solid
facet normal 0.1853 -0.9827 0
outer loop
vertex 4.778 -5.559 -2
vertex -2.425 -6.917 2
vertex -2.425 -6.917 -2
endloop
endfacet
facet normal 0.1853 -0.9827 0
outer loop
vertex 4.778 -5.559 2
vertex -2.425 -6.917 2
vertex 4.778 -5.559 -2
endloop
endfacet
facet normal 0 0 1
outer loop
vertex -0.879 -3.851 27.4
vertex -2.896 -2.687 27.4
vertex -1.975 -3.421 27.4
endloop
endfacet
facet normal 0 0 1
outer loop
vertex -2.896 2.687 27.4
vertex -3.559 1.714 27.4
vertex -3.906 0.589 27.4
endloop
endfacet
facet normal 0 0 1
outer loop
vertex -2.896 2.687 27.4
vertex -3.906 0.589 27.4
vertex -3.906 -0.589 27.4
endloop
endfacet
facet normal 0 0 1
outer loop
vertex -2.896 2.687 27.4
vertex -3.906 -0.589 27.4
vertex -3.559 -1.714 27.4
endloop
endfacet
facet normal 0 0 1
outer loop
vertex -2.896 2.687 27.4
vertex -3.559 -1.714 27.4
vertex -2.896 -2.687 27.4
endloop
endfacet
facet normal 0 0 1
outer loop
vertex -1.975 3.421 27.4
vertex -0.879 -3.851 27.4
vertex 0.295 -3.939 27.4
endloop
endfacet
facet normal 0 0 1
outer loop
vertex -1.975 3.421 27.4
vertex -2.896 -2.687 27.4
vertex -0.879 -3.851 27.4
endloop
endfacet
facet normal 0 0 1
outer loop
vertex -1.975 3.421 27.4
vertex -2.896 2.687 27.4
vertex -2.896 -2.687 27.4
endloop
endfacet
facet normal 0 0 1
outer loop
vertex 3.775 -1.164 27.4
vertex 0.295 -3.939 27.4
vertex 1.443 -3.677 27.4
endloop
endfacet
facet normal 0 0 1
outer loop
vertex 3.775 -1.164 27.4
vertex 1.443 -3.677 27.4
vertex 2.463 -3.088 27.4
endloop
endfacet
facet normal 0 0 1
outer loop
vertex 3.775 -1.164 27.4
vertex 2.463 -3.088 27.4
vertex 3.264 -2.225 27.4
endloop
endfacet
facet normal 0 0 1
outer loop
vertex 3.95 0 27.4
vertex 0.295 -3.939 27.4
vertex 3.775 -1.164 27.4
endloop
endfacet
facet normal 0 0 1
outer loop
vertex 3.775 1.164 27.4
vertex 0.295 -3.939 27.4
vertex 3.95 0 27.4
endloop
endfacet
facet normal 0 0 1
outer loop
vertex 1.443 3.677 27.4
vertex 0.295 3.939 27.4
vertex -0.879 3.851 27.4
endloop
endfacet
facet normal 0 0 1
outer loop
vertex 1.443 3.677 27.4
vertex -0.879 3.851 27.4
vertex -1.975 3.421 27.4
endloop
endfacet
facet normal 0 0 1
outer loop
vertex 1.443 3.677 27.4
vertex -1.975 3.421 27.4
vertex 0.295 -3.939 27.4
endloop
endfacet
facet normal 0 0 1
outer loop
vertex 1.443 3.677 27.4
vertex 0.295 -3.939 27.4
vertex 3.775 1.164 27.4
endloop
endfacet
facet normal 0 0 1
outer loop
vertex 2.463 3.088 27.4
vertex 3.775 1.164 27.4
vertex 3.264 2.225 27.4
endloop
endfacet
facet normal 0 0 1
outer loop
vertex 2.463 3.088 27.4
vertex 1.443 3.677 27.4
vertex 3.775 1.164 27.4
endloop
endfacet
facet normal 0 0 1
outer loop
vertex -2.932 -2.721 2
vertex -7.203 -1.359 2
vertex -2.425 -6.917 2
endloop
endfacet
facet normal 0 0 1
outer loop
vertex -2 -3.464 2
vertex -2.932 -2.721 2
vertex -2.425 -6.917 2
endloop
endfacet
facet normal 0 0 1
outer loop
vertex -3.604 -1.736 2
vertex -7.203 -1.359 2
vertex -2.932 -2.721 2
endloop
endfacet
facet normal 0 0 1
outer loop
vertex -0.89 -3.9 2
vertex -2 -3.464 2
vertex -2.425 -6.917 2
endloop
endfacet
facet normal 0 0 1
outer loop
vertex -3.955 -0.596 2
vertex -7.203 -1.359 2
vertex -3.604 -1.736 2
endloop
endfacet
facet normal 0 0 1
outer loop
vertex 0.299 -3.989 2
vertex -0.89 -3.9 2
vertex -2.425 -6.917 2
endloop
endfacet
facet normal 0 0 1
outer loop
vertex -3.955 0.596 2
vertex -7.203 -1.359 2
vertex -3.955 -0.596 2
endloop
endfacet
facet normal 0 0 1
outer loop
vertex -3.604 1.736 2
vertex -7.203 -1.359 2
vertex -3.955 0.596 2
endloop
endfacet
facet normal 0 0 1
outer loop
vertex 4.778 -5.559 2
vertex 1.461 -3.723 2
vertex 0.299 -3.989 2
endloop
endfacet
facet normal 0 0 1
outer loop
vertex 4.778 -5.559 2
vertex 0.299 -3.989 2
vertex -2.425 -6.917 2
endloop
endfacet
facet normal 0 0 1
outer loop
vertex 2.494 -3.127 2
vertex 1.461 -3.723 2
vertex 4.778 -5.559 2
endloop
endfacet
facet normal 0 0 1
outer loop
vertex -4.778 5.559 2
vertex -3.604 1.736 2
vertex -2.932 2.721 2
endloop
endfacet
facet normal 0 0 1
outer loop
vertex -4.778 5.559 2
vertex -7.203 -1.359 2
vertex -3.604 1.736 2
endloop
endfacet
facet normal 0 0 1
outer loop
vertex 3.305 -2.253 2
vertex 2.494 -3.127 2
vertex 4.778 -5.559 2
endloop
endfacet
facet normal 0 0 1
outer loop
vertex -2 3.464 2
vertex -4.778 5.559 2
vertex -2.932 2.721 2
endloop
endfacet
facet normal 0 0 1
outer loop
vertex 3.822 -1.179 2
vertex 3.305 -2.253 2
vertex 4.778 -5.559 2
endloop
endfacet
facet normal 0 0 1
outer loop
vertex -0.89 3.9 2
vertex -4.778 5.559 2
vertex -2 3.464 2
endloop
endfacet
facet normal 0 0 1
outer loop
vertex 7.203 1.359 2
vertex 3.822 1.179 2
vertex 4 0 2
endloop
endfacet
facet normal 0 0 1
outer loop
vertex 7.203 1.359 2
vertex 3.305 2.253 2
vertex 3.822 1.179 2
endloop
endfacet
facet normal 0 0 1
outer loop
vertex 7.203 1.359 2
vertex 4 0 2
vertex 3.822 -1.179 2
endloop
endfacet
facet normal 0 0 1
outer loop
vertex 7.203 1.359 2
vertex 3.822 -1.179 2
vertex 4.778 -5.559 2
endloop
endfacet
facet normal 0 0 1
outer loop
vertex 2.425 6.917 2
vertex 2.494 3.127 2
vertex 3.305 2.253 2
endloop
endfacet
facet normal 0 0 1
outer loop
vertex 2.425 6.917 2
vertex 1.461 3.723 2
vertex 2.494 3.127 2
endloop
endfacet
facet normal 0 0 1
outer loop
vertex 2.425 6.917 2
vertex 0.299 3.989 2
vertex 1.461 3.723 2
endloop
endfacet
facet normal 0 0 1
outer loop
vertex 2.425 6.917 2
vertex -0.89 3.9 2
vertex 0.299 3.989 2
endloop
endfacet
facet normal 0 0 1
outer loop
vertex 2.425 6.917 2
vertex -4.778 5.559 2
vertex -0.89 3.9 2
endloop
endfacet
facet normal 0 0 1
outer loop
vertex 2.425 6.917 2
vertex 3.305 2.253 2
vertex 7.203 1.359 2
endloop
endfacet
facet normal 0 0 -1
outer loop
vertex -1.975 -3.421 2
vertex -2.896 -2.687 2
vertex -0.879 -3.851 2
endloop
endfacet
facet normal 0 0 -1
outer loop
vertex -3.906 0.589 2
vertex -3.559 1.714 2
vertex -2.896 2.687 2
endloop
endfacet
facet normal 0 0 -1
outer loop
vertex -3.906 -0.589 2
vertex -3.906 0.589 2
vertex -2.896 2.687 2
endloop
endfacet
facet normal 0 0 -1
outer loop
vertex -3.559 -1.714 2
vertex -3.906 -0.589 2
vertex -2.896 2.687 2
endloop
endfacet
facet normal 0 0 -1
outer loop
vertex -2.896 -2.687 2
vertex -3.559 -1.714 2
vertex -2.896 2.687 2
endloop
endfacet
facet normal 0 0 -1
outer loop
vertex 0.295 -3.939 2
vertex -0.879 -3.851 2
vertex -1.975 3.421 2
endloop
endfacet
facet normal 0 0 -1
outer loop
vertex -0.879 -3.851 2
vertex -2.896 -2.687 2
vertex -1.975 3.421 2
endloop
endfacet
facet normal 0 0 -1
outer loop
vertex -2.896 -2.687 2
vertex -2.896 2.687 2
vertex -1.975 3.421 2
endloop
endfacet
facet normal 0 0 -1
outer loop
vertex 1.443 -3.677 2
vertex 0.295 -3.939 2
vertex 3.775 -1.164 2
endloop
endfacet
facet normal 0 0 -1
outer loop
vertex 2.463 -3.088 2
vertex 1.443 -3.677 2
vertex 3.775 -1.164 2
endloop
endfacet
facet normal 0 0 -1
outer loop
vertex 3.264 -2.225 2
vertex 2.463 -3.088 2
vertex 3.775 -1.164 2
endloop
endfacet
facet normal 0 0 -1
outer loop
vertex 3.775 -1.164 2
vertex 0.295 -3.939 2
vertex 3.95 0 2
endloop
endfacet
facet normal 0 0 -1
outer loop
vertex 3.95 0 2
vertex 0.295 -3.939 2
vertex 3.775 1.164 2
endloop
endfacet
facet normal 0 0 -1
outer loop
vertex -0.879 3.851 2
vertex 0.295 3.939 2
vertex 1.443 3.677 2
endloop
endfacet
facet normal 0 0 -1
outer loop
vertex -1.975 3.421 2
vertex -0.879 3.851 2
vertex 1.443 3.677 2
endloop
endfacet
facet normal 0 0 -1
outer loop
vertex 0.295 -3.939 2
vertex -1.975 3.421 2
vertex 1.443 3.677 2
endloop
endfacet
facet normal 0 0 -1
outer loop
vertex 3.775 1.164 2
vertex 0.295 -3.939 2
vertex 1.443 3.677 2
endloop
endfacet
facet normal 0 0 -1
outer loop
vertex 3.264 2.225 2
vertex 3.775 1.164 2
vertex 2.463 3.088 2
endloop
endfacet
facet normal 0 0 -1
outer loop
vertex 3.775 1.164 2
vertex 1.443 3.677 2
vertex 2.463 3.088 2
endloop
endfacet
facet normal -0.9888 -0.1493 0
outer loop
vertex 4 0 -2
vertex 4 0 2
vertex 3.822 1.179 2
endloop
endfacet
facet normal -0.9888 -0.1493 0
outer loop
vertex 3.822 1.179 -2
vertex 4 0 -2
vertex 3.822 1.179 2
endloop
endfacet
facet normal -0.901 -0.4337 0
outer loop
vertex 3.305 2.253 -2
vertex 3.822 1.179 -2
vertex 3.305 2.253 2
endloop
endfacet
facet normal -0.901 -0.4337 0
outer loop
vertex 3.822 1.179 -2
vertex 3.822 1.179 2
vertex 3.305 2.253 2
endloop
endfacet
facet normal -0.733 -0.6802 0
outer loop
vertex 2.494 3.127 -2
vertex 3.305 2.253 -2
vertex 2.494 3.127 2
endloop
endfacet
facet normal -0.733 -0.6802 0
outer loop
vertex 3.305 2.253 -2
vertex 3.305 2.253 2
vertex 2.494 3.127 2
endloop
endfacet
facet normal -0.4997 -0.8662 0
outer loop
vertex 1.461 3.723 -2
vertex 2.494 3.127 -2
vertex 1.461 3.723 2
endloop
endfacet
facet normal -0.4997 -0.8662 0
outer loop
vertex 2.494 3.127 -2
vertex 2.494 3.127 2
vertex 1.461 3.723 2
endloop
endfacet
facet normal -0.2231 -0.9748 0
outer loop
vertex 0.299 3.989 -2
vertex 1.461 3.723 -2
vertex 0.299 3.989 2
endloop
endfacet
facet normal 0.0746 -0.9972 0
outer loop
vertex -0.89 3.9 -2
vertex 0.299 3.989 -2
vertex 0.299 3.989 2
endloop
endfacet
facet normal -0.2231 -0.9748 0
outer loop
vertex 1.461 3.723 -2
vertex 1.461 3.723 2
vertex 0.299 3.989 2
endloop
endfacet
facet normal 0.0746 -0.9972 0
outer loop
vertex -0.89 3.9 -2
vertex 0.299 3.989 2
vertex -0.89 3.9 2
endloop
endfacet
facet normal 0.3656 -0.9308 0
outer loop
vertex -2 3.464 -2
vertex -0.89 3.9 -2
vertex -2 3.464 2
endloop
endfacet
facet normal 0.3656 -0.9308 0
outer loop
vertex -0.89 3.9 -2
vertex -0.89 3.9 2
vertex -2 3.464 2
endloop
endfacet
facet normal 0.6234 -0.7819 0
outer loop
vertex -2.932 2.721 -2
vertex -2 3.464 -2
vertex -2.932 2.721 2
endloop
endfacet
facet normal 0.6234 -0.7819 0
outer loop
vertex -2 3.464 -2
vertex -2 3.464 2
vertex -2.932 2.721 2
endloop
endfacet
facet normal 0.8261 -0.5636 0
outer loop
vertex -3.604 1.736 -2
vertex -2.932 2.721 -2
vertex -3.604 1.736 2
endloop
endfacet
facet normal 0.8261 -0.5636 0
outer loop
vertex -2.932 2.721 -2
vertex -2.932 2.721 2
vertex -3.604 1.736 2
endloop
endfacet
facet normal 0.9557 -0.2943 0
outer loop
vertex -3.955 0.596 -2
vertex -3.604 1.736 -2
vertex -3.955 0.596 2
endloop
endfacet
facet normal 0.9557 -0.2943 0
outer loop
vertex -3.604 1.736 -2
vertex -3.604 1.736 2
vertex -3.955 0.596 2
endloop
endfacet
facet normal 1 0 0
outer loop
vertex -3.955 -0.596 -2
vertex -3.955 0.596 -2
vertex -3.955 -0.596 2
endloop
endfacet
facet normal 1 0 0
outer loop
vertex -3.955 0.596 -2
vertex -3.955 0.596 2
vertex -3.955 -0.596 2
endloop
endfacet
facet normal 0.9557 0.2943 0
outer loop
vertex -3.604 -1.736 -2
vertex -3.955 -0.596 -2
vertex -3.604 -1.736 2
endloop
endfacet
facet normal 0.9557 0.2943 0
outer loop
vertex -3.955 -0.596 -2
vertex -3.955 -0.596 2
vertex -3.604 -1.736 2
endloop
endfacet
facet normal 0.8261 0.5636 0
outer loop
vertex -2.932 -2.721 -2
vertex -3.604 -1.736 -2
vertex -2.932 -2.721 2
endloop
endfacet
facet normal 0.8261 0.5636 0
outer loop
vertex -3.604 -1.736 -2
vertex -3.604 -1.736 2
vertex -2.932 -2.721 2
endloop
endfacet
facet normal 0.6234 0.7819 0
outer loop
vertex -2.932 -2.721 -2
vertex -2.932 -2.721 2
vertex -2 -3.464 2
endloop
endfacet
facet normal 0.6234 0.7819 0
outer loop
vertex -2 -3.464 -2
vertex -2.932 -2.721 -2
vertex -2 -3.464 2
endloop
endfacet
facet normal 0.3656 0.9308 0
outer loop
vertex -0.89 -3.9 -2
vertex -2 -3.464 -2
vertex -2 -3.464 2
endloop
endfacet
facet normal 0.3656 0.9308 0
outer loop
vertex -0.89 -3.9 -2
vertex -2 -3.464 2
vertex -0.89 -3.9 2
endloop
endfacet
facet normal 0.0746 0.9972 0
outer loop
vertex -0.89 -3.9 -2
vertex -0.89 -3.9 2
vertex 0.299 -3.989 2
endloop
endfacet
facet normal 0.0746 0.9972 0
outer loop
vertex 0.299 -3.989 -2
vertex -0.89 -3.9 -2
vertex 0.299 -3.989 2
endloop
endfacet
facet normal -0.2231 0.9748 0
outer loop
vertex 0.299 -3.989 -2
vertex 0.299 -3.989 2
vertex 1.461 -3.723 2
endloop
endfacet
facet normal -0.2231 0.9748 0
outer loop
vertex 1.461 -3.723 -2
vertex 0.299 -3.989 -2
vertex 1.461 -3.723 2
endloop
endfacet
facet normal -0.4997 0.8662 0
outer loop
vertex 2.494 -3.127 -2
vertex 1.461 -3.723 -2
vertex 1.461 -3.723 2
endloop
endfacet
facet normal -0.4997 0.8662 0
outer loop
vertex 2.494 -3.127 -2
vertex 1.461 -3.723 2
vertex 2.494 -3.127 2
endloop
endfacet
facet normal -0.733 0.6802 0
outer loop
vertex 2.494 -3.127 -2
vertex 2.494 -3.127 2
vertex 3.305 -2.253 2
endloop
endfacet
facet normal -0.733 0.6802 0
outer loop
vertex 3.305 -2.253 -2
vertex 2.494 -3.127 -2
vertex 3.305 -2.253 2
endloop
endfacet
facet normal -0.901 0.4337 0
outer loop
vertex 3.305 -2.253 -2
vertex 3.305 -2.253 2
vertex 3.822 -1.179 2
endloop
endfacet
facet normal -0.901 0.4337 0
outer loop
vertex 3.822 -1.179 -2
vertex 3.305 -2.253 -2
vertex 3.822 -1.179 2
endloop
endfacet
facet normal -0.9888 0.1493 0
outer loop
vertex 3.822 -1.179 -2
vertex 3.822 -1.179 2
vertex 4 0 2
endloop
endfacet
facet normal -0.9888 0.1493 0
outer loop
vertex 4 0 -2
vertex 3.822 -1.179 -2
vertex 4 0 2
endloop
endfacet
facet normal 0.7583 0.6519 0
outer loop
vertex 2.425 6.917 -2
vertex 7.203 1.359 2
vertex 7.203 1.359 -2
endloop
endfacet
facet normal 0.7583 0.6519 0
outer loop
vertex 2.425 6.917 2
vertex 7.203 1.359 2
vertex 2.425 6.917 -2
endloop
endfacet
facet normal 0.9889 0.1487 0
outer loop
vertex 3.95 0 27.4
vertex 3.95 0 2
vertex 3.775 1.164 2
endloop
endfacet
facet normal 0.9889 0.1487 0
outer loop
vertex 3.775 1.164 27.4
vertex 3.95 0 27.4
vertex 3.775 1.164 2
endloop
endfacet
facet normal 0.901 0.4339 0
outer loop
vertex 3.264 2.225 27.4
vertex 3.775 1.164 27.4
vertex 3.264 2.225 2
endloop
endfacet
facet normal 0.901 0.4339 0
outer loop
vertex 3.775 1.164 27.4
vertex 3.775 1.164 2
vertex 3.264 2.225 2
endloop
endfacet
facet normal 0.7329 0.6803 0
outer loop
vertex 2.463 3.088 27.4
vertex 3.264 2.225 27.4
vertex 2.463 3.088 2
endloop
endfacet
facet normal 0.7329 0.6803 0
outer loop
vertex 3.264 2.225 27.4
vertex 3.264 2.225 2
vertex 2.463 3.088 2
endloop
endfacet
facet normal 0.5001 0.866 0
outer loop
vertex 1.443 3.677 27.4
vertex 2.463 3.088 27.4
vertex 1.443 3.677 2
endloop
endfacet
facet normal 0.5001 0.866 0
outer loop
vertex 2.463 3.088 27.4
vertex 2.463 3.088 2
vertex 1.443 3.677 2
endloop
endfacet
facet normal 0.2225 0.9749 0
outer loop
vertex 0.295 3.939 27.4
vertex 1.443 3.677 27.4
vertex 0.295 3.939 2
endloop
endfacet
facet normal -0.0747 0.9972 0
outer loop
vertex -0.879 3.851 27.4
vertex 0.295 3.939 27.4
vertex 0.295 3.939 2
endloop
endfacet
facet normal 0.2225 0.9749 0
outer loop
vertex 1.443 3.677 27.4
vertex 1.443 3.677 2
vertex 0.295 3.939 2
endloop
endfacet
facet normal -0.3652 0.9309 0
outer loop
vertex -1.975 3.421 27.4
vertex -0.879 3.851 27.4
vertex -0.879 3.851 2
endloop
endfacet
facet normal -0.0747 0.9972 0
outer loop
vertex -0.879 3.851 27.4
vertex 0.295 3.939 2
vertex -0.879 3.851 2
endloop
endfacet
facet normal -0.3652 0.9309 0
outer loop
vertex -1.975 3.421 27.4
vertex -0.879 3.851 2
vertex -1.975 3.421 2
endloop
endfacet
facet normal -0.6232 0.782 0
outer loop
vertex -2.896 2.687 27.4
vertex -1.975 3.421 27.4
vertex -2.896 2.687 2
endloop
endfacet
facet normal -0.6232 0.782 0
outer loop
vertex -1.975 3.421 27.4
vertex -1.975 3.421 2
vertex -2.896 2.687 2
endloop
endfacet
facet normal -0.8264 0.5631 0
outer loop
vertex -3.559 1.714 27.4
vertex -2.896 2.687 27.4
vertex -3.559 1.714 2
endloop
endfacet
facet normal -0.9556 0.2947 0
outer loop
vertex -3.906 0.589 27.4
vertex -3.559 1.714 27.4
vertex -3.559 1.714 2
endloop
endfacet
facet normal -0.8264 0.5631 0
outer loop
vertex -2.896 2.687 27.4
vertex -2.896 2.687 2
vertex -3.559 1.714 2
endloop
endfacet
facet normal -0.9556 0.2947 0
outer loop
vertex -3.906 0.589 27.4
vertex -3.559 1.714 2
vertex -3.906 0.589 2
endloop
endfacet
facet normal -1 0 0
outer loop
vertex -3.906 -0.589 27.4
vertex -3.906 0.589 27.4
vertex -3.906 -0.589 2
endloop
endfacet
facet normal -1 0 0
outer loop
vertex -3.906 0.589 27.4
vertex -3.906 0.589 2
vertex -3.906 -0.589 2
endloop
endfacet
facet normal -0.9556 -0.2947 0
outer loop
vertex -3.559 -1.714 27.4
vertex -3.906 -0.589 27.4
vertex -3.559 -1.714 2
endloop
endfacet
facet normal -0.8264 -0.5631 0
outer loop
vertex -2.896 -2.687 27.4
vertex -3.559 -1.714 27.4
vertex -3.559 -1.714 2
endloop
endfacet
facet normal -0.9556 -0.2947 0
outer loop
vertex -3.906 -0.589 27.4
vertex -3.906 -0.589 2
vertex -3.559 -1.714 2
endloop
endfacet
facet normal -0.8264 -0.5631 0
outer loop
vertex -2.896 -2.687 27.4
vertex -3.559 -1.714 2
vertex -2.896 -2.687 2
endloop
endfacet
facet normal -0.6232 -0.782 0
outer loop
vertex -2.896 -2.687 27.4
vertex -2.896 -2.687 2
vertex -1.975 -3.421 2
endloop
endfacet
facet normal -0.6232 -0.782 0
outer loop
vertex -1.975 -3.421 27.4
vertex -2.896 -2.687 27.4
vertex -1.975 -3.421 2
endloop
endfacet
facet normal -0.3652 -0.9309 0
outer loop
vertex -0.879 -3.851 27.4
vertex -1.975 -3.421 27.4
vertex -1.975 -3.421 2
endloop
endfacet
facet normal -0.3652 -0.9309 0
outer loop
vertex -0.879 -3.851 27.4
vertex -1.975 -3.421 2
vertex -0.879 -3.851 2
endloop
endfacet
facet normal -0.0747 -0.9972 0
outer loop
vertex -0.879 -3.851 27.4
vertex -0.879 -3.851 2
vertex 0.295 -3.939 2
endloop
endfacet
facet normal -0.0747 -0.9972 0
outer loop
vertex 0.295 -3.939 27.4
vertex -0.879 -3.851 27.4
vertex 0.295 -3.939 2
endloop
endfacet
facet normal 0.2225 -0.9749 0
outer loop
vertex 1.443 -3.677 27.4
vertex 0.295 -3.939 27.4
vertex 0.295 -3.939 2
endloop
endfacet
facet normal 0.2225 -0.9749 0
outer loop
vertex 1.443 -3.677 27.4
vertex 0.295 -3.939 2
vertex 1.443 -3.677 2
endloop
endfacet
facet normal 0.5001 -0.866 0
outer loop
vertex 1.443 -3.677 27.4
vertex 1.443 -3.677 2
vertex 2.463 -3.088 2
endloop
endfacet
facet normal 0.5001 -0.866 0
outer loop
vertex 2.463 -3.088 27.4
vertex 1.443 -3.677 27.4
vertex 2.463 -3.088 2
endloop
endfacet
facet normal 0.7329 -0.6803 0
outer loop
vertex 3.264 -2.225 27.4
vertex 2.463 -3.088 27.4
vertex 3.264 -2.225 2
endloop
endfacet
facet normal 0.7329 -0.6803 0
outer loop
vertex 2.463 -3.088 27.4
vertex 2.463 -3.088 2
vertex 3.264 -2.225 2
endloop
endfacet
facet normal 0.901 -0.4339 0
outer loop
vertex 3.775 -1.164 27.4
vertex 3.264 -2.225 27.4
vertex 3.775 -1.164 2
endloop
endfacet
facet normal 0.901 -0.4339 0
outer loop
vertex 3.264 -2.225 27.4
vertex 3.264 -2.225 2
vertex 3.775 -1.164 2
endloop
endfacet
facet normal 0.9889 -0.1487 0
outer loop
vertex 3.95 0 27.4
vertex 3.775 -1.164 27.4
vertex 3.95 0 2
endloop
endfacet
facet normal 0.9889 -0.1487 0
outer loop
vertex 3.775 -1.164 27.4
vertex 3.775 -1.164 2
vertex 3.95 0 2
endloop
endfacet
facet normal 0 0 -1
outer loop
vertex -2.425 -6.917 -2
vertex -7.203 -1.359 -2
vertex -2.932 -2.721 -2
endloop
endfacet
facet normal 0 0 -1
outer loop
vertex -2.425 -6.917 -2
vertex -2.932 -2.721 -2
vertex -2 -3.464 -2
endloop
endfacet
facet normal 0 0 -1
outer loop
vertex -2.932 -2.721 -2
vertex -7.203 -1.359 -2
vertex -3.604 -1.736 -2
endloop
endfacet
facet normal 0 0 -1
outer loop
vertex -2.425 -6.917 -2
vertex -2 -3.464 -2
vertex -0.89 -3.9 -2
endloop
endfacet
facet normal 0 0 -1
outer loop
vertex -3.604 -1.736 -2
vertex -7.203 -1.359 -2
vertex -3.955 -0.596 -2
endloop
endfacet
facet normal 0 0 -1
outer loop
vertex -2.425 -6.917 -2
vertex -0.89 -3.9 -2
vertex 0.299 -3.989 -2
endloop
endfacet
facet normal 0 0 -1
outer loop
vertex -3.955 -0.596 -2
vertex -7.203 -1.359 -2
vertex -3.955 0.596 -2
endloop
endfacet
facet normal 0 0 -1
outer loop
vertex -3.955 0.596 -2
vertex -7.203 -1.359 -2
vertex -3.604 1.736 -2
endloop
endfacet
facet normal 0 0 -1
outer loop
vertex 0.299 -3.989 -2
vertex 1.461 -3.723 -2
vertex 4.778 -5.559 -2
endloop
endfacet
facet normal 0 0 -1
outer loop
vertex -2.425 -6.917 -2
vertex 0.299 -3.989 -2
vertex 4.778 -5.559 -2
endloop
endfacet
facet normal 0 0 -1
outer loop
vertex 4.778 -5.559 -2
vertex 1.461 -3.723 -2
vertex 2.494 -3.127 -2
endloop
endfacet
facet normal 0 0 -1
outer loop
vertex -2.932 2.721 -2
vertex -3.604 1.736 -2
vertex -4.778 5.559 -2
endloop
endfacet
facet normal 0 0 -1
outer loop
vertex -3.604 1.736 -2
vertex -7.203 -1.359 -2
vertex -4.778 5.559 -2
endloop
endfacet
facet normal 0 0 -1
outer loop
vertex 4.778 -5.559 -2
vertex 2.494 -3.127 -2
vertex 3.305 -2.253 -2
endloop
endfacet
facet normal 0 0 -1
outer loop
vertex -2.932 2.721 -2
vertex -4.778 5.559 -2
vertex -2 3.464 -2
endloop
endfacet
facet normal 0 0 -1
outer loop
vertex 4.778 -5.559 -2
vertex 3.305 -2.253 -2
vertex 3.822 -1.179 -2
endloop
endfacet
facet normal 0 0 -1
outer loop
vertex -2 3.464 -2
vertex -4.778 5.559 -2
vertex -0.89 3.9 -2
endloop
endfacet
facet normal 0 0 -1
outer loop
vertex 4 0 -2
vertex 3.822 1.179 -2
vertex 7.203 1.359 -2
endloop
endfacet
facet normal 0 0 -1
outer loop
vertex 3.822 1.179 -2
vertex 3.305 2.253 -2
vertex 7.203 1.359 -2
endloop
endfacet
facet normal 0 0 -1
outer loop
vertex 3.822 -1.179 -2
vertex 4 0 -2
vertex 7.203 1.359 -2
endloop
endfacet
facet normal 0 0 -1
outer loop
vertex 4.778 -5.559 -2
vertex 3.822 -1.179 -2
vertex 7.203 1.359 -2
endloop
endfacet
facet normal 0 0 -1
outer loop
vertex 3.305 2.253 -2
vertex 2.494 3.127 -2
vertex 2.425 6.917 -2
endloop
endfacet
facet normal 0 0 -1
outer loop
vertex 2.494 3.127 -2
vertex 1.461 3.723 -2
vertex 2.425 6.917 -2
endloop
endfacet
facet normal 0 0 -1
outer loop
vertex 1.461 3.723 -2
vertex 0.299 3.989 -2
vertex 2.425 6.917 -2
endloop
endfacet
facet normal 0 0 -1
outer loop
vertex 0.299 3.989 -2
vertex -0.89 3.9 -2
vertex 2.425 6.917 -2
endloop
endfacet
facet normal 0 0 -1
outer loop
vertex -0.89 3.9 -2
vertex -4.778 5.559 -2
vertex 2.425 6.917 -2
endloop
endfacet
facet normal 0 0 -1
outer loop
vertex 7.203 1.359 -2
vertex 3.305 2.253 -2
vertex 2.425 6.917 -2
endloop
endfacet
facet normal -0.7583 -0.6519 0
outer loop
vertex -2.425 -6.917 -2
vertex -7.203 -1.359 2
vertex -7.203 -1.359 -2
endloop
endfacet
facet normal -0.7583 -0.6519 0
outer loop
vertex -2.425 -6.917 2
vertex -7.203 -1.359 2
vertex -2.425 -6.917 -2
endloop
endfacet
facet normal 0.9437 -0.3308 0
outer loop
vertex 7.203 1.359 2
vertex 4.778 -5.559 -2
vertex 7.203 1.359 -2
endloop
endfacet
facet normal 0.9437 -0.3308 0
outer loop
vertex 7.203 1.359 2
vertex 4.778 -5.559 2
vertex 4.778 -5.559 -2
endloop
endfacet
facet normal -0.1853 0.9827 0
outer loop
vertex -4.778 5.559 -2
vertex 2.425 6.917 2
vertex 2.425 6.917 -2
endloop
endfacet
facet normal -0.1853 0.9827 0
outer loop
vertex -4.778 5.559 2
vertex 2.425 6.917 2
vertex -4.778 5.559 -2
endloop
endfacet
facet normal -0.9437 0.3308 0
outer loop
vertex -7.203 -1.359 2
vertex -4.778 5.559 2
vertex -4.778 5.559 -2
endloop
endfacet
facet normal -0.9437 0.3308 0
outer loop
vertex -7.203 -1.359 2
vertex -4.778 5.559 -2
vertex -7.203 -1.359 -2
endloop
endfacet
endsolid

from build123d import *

# Parameters (mm, degrees)
F1_DEPTH = 2
F2_R     = 4
F3_DEPTH = 25
F4_R     = 3.95
F5_DEPTH = 25.4


with BuildPart() as f1:
    # F0 (on Top) → F1 (new body, symmetric)
    with BuildSketch(Plane.XY):
        Polygon((2.425009, 6.917242), (-4.778003, 5.55874), (-7.203011, -1.358502), (-2.425009, -6.917242), (4.778003, -5.55874), (7.203011, 1.358502), align=None)
    extrude(amount=F1_DEPTH, both=True)

    # F2 (on face) → F3 (cut)
    with BuildSketch(Plane.XY.offset(2)):
        Circle(F2_R)
    extrude(amount=-F3_DEPTH, mode=Mode.SUBTRACT)


with BuildPart() as f5:
    # F4 (on face) → F5 (new body)
    with BuildSketch(Plane.XY.offset(2)):
        Circle(F4_R)
    extrude(amount=F5_DEPTH)


solid = Compound([f1.part, f5.part])
